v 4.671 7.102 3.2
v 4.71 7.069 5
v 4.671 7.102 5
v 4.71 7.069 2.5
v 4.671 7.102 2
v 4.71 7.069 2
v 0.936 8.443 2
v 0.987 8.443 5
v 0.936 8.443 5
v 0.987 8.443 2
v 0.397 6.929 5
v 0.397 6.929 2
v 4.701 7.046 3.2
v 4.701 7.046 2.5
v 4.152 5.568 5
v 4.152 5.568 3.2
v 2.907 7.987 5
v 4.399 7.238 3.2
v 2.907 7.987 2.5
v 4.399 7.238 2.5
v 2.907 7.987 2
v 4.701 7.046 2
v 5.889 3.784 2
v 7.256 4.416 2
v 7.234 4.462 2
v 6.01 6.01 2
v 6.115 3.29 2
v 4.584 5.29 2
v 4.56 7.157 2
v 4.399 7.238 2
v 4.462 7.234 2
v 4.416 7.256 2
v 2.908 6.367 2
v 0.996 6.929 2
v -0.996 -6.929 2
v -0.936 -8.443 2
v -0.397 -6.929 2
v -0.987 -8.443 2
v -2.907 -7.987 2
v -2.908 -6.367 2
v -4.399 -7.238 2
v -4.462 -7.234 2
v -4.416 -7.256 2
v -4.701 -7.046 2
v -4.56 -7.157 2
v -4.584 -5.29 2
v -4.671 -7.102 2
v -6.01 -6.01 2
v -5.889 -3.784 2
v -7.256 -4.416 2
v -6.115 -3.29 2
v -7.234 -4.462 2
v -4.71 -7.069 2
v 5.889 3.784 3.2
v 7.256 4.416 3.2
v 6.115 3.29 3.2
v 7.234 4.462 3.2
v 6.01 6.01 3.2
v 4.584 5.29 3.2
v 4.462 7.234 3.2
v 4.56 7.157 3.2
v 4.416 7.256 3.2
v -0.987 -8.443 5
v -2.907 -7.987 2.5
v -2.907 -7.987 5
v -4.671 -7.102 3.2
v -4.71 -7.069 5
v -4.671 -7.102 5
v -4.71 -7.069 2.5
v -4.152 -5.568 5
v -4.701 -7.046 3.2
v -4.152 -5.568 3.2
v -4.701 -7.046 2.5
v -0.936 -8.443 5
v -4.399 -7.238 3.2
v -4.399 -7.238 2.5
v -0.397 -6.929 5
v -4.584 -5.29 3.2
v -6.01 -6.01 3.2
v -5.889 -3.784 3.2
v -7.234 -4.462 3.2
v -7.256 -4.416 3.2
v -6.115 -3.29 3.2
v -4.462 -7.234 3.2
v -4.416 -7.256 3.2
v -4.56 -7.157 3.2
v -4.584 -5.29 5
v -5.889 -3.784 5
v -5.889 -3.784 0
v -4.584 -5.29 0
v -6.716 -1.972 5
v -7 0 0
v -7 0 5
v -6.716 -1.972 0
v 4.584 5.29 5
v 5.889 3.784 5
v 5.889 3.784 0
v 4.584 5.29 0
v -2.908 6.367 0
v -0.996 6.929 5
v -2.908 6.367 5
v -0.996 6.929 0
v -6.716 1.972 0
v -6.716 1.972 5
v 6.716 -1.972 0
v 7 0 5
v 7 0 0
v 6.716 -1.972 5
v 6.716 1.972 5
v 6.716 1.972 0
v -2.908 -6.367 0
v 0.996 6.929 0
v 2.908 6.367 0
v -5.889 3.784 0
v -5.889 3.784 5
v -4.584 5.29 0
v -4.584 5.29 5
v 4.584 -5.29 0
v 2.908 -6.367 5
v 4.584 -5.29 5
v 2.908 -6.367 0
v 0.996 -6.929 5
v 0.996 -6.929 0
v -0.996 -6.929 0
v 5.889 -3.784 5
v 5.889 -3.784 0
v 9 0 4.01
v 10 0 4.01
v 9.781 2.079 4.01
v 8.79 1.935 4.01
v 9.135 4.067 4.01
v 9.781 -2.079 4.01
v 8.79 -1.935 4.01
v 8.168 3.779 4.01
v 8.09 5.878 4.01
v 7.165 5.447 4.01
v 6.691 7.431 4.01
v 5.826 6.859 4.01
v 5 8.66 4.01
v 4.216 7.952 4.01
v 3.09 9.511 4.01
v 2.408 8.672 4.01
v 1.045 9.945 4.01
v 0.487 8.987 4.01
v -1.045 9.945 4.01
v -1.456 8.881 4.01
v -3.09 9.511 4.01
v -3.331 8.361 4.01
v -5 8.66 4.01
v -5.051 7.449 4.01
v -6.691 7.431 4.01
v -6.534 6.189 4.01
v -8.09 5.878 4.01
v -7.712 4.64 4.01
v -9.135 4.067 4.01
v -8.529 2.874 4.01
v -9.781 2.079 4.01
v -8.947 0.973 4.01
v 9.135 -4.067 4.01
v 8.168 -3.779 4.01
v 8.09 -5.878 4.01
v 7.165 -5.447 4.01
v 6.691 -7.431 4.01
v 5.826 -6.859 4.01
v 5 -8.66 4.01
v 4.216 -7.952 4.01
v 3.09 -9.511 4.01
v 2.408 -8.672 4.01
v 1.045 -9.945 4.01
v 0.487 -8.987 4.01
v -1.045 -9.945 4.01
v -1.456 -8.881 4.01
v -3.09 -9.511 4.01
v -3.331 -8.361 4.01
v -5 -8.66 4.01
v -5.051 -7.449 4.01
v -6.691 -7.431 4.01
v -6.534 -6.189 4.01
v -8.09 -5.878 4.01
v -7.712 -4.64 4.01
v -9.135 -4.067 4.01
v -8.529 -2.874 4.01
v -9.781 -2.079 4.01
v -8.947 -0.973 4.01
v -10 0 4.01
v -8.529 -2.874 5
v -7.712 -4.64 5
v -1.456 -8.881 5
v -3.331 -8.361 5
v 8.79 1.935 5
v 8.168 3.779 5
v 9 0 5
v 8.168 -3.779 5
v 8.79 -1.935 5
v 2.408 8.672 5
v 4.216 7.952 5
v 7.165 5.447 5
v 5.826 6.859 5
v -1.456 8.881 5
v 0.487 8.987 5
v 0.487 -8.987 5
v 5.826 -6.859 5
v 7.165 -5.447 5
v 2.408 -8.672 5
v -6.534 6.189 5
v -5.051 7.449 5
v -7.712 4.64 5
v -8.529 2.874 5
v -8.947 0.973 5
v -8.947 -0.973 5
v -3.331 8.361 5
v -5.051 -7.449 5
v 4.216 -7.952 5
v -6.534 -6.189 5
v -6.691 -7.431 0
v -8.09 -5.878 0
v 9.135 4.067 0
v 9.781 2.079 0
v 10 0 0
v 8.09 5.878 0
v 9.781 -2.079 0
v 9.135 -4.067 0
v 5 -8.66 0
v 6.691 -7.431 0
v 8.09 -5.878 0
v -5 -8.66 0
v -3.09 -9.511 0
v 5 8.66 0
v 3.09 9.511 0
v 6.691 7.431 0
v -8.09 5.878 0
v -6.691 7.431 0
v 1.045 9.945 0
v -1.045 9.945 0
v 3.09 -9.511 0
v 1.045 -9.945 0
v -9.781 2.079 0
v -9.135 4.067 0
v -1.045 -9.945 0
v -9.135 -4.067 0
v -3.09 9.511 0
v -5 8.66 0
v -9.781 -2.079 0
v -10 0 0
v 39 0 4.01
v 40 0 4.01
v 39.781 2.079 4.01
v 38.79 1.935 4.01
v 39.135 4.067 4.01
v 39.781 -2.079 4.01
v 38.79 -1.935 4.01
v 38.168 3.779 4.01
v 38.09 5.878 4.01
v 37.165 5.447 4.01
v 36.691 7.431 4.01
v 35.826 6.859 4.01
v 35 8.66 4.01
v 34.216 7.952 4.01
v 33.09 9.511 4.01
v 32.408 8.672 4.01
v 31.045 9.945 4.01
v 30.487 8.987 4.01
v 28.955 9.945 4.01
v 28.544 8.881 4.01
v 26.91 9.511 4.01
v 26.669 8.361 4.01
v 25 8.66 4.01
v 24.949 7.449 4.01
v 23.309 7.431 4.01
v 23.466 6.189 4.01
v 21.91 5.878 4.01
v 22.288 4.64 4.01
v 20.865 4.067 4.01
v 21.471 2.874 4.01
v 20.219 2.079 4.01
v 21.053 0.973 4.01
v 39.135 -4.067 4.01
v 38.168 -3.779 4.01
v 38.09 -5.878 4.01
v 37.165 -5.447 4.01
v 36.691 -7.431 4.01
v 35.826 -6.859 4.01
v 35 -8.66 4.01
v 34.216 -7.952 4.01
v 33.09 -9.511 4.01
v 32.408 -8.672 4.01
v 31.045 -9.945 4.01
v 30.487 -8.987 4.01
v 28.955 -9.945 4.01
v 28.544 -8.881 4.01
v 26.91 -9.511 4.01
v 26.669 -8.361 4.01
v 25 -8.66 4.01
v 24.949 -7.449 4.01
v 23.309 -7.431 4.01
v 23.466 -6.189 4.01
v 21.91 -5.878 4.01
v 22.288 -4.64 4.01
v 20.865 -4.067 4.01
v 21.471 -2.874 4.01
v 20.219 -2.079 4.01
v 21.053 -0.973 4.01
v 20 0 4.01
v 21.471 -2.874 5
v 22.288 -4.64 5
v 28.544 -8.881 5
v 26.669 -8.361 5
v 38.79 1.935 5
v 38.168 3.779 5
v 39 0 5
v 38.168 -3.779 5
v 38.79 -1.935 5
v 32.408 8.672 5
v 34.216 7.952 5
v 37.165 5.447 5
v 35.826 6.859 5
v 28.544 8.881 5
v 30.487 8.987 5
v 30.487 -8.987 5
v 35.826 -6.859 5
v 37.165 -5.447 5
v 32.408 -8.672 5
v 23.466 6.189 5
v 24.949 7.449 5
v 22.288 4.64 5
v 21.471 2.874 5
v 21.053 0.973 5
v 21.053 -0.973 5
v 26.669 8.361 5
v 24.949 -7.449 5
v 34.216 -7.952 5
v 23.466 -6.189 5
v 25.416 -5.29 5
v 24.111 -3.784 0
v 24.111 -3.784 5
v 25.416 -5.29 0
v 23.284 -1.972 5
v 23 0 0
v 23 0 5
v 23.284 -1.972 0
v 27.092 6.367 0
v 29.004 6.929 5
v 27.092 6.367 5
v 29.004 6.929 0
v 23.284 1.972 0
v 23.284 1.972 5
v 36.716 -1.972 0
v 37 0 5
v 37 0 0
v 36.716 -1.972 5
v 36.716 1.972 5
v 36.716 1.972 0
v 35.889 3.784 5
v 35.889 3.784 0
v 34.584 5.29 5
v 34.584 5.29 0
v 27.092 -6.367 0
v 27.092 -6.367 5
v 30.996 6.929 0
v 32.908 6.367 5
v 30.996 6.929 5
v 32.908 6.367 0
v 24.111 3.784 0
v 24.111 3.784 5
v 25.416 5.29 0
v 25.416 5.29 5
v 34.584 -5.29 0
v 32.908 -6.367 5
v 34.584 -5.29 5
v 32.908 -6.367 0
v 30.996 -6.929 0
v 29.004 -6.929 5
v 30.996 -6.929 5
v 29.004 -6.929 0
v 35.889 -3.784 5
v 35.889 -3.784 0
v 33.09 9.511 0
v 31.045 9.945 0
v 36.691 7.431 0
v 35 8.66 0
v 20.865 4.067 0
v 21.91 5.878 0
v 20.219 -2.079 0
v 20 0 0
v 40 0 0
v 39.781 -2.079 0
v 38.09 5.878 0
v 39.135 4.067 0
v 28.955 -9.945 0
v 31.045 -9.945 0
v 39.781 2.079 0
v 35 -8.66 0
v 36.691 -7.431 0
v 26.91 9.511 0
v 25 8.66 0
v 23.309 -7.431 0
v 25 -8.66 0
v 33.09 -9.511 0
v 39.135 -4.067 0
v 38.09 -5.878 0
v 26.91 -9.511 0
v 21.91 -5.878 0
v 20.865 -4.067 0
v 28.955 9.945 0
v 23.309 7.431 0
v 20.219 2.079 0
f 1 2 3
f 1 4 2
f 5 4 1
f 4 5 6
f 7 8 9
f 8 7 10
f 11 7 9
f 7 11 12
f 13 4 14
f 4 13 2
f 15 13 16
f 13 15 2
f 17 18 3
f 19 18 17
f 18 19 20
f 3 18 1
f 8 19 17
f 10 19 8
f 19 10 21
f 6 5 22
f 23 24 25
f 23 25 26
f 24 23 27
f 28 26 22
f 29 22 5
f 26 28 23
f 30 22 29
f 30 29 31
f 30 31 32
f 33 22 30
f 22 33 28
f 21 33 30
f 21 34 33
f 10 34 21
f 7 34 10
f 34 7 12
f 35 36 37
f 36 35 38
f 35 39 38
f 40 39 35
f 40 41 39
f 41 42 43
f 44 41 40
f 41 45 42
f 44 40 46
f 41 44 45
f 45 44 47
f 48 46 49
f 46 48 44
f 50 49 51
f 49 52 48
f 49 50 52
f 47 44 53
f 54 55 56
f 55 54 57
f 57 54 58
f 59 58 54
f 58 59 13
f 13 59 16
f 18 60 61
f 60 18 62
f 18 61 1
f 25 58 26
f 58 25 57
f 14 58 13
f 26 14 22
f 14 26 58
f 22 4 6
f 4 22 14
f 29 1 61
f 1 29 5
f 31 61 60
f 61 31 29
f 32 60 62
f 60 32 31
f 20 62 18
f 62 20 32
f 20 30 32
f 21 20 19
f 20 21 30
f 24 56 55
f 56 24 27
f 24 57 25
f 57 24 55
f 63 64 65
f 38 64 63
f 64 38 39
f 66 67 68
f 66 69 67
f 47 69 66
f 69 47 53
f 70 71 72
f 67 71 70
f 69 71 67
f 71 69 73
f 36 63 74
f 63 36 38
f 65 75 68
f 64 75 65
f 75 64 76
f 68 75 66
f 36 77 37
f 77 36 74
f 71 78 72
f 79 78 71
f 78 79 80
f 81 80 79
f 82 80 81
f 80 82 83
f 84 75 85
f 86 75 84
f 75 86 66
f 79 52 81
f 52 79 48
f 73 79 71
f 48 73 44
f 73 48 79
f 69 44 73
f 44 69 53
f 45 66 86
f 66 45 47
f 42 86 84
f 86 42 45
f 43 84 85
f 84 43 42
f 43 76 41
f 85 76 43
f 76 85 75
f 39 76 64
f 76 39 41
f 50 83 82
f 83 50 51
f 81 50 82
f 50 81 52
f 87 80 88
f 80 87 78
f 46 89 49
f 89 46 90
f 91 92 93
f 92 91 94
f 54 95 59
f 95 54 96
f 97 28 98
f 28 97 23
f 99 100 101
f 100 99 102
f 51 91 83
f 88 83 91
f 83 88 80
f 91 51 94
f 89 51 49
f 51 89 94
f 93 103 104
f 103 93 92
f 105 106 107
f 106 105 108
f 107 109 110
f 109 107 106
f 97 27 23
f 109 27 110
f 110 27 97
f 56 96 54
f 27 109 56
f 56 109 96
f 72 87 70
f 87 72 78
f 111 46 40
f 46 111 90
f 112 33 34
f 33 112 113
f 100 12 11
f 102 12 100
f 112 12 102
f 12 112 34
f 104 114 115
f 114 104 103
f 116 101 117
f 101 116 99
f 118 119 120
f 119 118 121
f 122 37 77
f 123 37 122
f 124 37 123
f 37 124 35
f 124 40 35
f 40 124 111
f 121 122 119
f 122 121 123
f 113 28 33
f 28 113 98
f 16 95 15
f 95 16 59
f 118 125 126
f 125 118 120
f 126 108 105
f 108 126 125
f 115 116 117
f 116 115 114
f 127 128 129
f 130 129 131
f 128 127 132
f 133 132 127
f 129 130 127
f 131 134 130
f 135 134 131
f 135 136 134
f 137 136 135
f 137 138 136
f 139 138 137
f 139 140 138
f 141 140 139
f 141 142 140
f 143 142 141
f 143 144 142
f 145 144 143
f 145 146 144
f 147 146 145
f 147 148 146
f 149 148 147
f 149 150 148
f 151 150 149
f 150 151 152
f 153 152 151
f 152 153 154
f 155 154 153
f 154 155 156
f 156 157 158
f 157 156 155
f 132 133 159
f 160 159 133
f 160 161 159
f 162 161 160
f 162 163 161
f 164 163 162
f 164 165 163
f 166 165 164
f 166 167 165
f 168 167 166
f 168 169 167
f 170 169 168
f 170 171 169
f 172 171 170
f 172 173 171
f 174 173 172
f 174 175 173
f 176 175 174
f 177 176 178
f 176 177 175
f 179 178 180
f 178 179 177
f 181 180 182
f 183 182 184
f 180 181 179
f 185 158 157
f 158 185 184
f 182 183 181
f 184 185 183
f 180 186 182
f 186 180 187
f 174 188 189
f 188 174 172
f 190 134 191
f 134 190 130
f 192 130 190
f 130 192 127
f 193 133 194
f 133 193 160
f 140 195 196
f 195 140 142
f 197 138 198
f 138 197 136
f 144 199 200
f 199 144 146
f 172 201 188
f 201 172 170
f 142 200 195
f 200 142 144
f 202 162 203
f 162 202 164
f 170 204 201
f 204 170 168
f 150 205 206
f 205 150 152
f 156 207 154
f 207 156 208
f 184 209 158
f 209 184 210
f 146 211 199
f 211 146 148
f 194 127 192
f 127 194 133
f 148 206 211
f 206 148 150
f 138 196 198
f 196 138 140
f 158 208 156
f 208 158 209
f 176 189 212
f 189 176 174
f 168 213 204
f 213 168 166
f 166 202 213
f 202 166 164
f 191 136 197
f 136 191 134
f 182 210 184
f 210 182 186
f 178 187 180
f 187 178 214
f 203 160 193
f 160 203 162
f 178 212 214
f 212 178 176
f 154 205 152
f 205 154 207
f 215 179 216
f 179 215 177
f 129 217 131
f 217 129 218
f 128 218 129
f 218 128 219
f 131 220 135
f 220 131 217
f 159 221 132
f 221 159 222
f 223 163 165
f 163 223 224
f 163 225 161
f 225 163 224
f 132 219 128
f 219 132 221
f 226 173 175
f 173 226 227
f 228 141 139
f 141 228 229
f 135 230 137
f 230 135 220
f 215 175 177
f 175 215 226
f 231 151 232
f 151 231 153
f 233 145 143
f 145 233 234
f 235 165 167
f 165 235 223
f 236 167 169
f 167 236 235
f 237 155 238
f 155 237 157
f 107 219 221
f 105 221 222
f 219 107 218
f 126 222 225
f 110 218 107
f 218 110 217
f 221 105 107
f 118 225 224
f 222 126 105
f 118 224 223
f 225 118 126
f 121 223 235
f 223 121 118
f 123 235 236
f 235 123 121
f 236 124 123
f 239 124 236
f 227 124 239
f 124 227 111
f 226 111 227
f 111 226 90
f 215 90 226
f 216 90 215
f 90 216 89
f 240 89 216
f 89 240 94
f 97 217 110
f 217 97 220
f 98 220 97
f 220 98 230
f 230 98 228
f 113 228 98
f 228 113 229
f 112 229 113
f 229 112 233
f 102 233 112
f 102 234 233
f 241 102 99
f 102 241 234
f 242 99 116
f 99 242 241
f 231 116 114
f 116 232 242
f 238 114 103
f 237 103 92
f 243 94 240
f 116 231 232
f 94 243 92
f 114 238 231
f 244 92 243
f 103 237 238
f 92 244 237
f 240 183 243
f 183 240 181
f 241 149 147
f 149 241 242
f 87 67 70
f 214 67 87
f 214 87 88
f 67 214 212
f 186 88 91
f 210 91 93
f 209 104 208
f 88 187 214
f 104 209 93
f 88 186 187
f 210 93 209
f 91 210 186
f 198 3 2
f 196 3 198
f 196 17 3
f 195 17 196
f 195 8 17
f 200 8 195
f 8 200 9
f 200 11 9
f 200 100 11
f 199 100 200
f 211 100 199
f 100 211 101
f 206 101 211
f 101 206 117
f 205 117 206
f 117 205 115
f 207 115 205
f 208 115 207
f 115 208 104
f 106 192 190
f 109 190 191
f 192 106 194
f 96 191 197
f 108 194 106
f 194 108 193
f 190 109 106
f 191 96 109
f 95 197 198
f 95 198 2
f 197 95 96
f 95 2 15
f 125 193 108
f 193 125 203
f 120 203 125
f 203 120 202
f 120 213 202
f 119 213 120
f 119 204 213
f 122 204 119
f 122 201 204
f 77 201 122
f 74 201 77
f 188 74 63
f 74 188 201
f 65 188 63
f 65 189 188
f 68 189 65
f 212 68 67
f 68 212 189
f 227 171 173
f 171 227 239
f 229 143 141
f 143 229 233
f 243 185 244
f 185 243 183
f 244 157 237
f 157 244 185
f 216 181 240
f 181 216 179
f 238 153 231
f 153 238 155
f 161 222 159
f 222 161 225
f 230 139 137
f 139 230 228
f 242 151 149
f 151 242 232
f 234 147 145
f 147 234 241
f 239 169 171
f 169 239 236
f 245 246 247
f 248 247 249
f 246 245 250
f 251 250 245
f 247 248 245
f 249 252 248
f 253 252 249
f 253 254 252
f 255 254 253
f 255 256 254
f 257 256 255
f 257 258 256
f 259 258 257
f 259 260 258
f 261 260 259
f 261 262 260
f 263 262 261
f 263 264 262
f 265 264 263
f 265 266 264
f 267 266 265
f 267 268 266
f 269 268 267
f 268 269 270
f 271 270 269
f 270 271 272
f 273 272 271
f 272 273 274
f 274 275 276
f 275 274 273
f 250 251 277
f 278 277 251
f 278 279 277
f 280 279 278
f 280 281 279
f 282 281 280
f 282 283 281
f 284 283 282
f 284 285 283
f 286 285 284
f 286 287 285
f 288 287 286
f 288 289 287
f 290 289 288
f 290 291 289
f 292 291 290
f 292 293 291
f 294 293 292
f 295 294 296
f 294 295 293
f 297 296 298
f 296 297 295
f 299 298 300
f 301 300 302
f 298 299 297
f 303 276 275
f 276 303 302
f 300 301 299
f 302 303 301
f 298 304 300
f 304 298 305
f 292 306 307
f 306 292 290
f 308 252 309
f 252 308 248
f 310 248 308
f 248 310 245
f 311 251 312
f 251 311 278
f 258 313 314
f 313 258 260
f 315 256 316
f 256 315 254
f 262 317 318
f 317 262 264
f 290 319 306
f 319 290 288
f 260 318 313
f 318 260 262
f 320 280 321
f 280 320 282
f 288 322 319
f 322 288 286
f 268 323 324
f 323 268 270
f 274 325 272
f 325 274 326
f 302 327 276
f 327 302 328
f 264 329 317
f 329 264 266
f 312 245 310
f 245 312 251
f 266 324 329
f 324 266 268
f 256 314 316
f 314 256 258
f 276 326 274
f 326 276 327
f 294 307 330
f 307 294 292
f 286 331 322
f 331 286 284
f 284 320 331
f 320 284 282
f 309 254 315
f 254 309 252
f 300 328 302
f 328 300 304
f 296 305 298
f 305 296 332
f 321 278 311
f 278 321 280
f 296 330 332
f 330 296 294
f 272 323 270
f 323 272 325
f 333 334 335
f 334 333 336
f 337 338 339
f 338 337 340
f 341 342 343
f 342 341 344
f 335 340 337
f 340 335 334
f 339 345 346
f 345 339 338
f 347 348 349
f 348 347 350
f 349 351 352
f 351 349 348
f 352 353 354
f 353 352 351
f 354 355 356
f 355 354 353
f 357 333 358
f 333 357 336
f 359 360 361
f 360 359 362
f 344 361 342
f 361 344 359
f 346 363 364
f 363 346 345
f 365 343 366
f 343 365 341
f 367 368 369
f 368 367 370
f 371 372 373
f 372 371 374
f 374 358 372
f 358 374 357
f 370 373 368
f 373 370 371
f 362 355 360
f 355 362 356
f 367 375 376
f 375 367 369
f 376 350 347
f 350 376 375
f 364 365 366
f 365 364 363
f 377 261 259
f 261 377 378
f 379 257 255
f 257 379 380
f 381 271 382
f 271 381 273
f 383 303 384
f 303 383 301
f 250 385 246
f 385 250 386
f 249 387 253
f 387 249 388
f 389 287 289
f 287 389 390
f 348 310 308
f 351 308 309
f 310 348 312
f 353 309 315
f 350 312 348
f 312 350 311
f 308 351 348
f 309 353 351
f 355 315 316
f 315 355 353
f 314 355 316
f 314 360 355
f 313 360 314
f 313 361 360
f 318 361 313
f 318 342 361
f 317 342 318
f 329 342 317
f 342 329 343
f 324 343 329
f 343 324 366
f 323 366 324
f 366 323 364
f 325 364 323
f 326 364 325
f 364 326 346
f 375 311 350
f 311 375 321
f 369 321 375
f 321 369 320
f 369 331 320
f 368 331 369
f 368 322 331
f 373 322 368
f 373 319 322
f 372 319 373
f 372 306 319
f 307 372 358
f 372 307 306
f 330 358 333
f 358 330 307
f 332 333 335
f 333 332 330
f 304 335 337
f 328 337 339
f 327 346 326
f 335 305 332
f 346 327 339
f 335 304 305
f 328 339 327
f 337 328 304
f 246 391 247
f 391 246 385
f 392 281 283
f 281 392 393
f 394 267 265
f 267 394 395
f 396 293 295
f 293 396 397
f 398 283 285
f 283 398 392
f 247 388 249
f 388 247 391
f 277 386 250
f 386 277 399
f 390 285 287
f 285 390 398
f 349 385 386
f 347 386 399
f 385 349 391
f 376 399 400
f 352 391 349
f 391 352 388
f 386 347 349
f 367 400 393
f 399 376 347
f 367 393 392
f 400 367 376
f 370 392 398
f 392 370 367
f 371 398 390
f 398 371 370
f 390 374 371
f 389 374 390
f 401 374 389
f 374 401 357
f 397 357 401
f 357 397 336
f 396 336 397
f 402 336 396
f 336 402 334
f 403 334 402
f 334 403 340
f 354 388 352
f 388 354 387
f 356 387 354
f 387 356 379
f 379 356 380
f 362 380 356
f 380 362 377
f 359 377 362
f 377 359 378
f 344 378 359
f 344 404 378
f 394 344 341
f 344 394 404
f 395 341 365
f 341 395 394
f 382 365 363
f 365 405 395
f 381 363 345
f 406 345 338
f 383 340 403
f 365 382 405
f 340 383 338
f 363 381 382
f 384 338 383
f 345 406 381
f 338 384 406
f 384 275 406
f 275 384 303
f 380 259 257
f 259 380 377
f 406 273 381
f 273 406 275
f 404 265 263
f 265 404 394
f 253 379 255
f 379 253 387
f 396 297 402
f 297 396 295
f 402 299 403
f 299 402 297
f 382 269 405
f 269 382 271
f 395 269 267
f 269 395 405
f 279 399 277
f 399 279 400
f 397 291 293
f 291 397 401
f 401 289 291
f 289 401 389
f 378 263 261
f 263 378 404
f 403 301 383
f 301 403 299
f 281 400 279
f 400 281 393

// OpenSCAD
// file: ../CircleSlice.scad
module CircleSliceLinear2D(radius, width)
{
  intersection()
  {
    circle(r = radius);

    hull()
    {
      translate([radius, 0, 0])
      {
        translate([0, width/2])
          circle(r=0.01);
        translate([0, -width/2])
          circle(r=0.01);
      }
      circle(r = width/2);
    }
  }
}

module CircleSliceAngular2D(radius, angle)
{
  intersection()
  {
    circle(r = radius);

    hull()
    {
      translate([radius, 0, 0])
        circle(r=0.01);

      rotate([0, 0, angle])
        translate([radius, 0, 0])
          circle(r=0.01);

      circle(r=0.01);
    }
  }
}
// file: ../BubblescopeMount.scad
use <CircleSlice.scad>

module BubblescopeThreads(scope_radius, scope_mount_height, angle, carrier_width, carrier_height)
{
  rad = scope_radius + 1.5;
  offset_angle = -25;

  rotate([0, 0, angle-offset_angle])
  {
    translate([0, 0, scope_mount_height-1.5])
      linear_extrude(height=carrier_height + 5)
        CircleSliceLinear2D(rad, carrier_width);

    translate([0, 0, scope_mount_height-2])
    {
      linear_extrude(height=carrier_height)
      {
        CircleSliceLinear2D(rad, carrier_width);
        rotate([0, 0, offset_angle])
          CircleSliceLinear2D(rad, carrier_width);
      }
    }
  }
}

module BubblescopeBracket(scope_radius, scope_mount_height, threads)
{
  translate([0, 0, -1])
	{
    cylinder(r=scope_radius, h=scope_mount_height+2);

    if(threads)
    {
      BubblescopeThreads(scope_radius, scope_mount_height, 45, 4, 1.2);
      BubblescopeThreads(scope_radius, scope_mount_height, -135, 4, 1.2);
    }
  }
}

module BubblescopeMount(threads=true)
{
  difference()
  {
    cylinder(r=10, h=5);

		union()
		{
			BubblescopeBracket(7, 5, threads);
			translate([0, 0, 4.01])
      {
				difference()
				{
					cylinder(r=10.1, h=1);
					translate([0, 0, -0.1])
						cylinder(r=9, h=1.2);
				}
      }
		}
  }
}
// main file
use <../BubblescopeMount.scad>;

BubblescopeMount(threads=true);

translate([30, 0, 0])
  BubblescopeMount(threads=false);
